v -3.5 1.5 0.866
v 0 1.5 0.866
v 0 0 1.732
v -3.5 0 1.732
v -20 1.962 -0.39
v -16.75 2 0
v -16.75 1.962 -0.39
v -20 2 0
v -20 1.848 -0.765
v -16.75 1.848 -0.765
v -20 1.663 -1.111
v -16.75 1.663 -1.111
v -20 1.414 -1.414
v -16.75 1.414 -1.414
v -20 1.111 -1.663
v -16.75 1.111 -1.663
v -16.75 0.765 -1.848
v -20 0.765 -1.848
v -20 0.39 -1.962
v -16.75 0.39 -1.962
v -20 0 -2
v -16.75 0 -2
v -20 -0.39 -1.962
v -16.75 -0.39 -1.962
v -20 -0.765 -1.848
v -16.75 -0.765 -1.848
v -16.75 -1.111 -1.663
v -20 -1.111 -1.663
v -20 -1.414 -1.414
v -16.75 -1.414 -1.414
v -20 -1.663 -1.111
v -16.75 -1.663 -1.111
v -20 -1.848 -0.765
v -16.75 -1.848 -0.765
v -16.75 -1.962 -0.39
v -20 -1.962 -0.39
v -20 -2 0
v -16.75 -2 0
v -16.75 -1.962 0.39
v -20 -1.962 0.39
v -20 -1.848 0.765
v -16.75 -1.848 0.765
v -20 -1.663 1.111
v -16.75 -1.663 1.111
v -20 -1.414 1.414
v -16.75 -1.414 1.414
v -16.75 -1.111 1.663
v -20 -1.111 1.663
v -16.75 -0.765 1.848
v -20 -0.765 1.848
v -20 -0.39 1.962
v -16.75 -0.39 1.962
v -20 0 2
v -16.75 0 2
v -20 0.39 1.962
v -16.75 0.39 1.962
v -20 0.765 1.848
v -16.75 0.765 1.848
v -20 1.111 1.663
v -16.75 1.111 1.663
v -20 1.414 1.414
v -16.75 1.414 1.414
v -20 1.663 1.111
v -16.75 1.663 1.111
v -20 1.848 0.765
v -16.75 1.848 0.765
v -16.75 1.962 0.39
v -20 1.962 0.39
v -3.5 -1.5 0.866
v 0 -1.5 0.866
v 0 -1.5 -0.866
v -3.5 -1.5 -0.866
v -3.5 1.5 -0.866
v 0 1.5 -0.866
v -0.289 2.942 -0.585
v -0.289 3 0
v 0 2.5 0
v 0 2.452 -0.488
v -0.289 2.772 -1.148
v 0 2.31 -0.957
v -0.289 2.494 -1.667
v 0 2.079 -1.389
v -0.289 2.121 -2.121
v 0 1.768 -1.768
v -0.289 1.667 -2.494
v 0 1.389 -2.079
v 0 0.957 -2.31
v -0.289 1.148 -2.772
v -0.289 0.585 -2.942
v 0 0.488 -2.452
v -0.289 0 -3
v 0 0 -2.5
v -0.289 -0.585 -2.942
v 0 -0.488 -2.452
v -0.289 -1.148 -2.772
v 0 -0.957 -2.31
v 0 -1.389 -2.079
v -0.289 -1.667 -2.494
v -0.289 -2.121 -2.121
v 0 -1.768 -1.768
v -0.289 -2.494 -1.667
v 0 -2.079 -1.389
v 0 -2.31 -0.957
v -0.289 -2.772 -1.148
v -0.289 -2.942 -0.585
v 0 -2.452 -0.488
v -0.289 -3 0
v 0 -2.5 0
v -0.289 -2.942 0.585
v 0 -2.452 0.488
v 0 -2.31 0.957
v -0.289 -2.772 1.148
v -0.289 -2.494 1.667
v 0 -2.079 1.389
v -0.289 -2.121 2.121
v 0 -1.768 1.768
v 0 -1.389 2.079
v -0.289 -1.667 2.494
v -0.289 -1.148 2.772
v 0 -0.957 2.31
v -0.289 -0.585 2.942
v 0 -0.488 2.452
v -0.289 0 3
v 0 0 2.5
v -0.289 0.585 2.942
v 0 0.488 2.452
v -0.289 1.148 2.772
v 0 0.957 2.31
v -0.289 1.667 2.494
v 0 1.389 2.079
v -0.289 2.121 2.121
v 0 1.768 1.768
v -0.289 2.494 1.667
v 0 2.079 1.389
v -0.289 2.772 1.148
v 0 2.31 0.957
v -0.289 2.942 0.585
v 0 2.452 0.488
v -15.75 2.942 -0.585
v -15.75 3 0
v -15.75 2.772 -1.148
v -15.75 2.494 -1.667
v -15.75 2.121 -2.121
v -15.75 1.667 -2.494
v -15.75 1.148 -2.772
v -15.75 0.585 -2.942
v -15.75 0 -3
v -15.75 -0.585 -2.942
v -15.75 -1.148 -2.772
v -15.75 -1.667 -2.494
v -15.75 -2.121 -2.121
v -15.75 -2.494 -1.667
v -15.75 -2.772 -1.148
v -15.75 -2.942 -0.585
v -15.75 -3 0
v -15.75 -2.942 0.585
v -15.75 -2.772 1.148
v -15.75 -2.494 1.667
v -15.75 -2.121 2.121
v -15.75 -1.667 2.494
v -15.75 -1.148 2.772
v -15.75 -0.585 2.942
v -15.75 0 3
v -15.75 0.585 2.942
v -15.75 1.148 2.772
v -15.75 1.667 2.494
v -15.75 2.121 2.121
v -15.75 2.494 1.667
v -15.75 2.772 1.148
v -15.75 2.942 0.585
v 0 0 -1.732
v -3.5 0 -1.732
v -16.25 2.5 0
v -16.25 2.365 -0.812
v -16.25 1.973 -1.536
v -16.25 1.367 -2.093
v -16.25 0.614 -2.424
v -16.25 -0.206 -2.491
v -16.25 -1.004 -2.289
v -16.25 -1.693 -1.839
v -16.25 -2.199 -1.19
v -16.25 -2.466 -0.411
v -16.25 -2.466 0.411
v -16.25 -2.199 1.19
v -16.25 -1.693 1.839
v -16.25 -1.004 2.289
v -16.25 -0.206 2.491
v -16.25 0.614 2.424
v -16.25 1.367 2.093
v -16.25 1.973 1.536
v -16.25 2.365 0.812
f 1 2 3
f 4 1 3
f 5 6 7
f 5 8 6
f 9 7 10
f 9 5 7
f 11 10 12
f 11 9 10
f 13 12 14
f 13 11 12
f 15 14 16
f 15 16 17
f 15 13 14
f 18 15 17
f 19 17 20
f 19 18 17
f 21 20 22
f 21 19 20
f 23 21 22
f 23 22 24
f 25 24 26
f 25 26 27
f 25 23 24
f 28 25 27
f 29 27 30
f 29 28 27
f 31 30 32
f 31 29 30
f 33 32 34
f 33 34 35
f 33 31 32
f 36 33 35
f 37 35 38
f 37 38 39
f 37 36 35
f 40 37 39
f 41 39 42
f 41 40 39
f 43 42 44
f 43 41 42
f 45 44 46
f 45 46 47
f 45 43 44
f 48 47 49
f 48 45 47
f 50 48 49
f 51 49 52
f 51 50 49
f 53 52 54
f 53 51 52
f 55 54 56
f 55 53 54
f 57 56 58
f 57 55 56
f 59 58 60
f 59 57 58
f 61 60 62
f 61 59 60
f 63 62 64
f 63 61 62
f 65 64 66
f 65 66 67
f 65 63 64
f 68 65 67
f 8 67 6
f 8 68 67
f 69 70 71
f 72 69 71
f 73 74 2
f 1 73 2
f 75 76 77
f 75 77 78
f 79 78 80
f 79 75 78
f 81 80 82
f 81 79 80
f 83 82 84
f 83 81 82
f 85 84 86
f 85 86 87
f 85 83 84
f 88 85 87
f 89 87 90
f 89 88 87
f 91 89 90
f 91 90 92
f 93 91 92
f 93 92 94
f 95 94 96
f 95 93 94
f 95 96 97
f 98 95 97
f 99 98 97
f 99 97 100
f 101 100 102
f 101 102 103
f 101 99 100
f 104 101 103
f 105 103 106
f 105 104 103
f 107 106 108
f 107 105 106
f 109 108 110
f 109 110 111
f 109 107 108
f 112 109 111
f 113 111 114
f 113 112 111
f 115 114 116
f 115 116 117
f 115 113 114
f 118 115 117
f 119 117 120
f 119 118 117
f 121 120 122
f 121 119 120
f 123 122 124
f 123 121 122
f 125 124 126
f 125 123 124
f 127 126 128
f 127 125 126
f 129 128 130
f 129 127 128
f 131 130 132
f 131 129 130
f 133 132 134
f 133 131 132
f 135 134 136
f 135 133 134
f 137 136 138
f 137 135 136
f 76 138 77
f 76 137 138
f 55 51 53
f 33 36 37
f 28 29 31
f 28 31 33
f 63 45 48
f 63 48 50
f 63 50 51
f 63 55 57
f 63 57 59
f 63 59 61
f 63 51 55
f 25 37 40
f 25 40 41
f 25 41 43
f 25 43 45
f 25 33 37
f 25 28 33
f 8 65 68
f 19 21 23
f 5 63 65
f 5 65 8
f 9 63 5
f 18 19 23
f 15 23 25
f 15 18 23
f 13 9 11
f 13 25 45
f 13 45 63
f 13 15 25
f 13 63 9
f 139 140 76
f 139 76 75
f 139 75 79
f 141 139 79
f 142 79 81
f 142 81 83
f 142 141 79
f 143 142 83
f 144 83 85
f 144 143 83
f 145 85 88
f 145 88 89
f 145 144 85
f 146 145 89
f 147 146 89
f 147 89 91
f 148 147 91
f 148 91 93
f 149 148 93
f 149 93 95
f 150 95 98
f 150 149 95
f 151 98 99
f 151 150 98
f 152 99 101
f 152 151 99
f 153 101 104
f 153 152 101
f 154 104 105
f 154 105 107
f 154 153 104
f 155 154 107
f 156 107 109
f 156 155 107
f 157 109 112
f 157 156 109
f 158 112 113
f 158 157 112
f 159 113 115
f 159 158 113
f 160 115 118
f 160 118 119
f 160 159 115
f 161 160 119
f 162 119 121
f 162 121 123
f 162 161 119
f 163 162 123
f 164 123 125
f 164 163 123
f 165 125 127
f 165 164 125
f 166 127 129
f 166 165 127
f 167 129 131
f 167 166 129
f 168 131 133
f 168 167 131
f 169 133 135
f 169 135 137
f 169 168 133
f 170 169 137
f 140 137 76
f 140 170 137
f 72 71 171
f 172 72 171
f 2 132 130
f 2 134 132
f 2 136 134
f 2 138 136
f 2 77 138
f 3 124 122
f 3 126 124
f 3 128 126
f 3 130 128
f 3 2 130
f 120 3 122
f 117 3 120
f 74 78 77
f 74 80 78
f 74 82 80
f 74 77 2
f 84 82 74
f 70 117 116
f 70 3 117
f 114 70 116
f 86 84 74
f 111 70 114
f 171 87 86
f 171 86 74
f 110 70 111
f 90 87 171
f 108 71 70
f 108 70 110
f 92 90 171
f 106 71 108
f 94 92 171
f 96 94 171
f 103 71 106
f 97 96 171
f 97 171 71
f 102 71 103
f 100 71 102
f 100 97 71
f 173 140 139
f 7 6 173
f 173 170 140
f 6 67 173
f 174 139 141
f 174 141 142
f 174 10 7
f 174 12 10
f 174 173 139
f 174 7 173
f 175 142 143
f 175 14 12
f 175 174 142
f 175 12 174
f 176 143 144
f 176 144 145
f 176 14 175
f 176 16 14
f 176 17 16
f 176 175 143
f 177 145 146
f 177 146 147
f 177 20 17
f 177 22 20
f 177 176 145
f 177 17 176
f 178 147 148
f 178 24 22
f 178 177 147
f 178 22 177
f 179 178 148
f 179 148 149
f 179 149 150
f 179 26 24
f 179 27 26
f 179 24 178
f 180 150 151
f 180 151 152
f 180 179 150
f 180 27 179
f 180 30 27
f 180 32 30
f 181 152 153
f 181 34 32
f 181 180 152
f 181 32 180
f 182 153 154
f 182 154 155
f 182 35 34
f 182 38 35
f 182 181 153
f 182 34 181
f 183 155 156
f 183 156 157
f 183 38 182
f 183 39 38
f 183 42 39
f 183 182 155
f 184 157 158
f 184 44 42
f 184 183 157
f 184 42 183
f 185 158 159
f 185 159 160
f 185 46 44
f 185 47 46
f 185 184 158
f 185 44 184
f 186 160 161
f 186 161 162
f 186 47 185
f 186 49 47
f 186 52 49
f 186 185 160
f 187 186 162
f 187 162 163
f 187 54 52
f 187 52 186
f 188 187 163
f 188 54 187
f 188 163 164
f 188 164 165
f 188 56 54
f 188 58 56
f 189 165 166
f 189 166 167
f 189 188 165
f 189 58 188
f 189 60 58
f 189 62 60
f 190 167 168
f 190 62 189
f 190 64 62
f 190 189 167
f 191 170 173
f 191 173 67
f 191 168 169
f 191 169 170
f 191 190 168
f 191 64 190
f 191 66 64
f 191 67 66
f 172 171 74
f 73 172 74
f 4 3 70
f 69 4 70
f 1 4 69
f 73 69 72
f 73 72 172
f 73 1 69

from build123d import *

# Parameters (mm, degrees)
CUT_EXTRUDE1_DEPTH = 3.5
CHAMFER1_SIZE      = 0.5
CHAMFER1_SIZE2     = 0.288675135


with BuildPart() as part:
    # Sketch1 → Revolve1 (revolve)
    with BuildSketch(Plane.XY):
        Polygon((0, 0), (0, 3), (-15.75, 3), (-16.75, 2), (-20, 2), (-20, 0), align=None)
    revolve(axis=Axis((0, 0, 0), (-1, 0, 0)))

    # Sketch2 → Cut-Extrude1 (cut)
    with BuildSketch(Plane(origin=(0, 0, 0), x_dir=(0, 0, -1), z_dir=(1, 0, 0))):
        Polygon((1.732050808, 0), (0.866025404, 1.5), (-0.866025404, 1.5), (-1.732050808, 0), (-0.866025404, -1.5), (0.866025404, -1.5), align=None)
    extrude(amount=-CUT_EXTRUDE1_DEPTH, mode=Mode.SUBTRACT)

    # Chamfer1
    chamfer1_edges = [part.edges().sort_by_distance(p)[0] for p in [
        (0, -3, 0),
    ]]
    chamfer1_side = [part.faces().sort_by_distance(p)[0] for p in [
        (0, -2.915147186, 0),
    ]]
    chamfer(chamfer1_edges, length=CHAMFER1_SIZE, length2=CHAMFER1_SIZE2, reference=chamfer1_side[0])


solid = part.part
